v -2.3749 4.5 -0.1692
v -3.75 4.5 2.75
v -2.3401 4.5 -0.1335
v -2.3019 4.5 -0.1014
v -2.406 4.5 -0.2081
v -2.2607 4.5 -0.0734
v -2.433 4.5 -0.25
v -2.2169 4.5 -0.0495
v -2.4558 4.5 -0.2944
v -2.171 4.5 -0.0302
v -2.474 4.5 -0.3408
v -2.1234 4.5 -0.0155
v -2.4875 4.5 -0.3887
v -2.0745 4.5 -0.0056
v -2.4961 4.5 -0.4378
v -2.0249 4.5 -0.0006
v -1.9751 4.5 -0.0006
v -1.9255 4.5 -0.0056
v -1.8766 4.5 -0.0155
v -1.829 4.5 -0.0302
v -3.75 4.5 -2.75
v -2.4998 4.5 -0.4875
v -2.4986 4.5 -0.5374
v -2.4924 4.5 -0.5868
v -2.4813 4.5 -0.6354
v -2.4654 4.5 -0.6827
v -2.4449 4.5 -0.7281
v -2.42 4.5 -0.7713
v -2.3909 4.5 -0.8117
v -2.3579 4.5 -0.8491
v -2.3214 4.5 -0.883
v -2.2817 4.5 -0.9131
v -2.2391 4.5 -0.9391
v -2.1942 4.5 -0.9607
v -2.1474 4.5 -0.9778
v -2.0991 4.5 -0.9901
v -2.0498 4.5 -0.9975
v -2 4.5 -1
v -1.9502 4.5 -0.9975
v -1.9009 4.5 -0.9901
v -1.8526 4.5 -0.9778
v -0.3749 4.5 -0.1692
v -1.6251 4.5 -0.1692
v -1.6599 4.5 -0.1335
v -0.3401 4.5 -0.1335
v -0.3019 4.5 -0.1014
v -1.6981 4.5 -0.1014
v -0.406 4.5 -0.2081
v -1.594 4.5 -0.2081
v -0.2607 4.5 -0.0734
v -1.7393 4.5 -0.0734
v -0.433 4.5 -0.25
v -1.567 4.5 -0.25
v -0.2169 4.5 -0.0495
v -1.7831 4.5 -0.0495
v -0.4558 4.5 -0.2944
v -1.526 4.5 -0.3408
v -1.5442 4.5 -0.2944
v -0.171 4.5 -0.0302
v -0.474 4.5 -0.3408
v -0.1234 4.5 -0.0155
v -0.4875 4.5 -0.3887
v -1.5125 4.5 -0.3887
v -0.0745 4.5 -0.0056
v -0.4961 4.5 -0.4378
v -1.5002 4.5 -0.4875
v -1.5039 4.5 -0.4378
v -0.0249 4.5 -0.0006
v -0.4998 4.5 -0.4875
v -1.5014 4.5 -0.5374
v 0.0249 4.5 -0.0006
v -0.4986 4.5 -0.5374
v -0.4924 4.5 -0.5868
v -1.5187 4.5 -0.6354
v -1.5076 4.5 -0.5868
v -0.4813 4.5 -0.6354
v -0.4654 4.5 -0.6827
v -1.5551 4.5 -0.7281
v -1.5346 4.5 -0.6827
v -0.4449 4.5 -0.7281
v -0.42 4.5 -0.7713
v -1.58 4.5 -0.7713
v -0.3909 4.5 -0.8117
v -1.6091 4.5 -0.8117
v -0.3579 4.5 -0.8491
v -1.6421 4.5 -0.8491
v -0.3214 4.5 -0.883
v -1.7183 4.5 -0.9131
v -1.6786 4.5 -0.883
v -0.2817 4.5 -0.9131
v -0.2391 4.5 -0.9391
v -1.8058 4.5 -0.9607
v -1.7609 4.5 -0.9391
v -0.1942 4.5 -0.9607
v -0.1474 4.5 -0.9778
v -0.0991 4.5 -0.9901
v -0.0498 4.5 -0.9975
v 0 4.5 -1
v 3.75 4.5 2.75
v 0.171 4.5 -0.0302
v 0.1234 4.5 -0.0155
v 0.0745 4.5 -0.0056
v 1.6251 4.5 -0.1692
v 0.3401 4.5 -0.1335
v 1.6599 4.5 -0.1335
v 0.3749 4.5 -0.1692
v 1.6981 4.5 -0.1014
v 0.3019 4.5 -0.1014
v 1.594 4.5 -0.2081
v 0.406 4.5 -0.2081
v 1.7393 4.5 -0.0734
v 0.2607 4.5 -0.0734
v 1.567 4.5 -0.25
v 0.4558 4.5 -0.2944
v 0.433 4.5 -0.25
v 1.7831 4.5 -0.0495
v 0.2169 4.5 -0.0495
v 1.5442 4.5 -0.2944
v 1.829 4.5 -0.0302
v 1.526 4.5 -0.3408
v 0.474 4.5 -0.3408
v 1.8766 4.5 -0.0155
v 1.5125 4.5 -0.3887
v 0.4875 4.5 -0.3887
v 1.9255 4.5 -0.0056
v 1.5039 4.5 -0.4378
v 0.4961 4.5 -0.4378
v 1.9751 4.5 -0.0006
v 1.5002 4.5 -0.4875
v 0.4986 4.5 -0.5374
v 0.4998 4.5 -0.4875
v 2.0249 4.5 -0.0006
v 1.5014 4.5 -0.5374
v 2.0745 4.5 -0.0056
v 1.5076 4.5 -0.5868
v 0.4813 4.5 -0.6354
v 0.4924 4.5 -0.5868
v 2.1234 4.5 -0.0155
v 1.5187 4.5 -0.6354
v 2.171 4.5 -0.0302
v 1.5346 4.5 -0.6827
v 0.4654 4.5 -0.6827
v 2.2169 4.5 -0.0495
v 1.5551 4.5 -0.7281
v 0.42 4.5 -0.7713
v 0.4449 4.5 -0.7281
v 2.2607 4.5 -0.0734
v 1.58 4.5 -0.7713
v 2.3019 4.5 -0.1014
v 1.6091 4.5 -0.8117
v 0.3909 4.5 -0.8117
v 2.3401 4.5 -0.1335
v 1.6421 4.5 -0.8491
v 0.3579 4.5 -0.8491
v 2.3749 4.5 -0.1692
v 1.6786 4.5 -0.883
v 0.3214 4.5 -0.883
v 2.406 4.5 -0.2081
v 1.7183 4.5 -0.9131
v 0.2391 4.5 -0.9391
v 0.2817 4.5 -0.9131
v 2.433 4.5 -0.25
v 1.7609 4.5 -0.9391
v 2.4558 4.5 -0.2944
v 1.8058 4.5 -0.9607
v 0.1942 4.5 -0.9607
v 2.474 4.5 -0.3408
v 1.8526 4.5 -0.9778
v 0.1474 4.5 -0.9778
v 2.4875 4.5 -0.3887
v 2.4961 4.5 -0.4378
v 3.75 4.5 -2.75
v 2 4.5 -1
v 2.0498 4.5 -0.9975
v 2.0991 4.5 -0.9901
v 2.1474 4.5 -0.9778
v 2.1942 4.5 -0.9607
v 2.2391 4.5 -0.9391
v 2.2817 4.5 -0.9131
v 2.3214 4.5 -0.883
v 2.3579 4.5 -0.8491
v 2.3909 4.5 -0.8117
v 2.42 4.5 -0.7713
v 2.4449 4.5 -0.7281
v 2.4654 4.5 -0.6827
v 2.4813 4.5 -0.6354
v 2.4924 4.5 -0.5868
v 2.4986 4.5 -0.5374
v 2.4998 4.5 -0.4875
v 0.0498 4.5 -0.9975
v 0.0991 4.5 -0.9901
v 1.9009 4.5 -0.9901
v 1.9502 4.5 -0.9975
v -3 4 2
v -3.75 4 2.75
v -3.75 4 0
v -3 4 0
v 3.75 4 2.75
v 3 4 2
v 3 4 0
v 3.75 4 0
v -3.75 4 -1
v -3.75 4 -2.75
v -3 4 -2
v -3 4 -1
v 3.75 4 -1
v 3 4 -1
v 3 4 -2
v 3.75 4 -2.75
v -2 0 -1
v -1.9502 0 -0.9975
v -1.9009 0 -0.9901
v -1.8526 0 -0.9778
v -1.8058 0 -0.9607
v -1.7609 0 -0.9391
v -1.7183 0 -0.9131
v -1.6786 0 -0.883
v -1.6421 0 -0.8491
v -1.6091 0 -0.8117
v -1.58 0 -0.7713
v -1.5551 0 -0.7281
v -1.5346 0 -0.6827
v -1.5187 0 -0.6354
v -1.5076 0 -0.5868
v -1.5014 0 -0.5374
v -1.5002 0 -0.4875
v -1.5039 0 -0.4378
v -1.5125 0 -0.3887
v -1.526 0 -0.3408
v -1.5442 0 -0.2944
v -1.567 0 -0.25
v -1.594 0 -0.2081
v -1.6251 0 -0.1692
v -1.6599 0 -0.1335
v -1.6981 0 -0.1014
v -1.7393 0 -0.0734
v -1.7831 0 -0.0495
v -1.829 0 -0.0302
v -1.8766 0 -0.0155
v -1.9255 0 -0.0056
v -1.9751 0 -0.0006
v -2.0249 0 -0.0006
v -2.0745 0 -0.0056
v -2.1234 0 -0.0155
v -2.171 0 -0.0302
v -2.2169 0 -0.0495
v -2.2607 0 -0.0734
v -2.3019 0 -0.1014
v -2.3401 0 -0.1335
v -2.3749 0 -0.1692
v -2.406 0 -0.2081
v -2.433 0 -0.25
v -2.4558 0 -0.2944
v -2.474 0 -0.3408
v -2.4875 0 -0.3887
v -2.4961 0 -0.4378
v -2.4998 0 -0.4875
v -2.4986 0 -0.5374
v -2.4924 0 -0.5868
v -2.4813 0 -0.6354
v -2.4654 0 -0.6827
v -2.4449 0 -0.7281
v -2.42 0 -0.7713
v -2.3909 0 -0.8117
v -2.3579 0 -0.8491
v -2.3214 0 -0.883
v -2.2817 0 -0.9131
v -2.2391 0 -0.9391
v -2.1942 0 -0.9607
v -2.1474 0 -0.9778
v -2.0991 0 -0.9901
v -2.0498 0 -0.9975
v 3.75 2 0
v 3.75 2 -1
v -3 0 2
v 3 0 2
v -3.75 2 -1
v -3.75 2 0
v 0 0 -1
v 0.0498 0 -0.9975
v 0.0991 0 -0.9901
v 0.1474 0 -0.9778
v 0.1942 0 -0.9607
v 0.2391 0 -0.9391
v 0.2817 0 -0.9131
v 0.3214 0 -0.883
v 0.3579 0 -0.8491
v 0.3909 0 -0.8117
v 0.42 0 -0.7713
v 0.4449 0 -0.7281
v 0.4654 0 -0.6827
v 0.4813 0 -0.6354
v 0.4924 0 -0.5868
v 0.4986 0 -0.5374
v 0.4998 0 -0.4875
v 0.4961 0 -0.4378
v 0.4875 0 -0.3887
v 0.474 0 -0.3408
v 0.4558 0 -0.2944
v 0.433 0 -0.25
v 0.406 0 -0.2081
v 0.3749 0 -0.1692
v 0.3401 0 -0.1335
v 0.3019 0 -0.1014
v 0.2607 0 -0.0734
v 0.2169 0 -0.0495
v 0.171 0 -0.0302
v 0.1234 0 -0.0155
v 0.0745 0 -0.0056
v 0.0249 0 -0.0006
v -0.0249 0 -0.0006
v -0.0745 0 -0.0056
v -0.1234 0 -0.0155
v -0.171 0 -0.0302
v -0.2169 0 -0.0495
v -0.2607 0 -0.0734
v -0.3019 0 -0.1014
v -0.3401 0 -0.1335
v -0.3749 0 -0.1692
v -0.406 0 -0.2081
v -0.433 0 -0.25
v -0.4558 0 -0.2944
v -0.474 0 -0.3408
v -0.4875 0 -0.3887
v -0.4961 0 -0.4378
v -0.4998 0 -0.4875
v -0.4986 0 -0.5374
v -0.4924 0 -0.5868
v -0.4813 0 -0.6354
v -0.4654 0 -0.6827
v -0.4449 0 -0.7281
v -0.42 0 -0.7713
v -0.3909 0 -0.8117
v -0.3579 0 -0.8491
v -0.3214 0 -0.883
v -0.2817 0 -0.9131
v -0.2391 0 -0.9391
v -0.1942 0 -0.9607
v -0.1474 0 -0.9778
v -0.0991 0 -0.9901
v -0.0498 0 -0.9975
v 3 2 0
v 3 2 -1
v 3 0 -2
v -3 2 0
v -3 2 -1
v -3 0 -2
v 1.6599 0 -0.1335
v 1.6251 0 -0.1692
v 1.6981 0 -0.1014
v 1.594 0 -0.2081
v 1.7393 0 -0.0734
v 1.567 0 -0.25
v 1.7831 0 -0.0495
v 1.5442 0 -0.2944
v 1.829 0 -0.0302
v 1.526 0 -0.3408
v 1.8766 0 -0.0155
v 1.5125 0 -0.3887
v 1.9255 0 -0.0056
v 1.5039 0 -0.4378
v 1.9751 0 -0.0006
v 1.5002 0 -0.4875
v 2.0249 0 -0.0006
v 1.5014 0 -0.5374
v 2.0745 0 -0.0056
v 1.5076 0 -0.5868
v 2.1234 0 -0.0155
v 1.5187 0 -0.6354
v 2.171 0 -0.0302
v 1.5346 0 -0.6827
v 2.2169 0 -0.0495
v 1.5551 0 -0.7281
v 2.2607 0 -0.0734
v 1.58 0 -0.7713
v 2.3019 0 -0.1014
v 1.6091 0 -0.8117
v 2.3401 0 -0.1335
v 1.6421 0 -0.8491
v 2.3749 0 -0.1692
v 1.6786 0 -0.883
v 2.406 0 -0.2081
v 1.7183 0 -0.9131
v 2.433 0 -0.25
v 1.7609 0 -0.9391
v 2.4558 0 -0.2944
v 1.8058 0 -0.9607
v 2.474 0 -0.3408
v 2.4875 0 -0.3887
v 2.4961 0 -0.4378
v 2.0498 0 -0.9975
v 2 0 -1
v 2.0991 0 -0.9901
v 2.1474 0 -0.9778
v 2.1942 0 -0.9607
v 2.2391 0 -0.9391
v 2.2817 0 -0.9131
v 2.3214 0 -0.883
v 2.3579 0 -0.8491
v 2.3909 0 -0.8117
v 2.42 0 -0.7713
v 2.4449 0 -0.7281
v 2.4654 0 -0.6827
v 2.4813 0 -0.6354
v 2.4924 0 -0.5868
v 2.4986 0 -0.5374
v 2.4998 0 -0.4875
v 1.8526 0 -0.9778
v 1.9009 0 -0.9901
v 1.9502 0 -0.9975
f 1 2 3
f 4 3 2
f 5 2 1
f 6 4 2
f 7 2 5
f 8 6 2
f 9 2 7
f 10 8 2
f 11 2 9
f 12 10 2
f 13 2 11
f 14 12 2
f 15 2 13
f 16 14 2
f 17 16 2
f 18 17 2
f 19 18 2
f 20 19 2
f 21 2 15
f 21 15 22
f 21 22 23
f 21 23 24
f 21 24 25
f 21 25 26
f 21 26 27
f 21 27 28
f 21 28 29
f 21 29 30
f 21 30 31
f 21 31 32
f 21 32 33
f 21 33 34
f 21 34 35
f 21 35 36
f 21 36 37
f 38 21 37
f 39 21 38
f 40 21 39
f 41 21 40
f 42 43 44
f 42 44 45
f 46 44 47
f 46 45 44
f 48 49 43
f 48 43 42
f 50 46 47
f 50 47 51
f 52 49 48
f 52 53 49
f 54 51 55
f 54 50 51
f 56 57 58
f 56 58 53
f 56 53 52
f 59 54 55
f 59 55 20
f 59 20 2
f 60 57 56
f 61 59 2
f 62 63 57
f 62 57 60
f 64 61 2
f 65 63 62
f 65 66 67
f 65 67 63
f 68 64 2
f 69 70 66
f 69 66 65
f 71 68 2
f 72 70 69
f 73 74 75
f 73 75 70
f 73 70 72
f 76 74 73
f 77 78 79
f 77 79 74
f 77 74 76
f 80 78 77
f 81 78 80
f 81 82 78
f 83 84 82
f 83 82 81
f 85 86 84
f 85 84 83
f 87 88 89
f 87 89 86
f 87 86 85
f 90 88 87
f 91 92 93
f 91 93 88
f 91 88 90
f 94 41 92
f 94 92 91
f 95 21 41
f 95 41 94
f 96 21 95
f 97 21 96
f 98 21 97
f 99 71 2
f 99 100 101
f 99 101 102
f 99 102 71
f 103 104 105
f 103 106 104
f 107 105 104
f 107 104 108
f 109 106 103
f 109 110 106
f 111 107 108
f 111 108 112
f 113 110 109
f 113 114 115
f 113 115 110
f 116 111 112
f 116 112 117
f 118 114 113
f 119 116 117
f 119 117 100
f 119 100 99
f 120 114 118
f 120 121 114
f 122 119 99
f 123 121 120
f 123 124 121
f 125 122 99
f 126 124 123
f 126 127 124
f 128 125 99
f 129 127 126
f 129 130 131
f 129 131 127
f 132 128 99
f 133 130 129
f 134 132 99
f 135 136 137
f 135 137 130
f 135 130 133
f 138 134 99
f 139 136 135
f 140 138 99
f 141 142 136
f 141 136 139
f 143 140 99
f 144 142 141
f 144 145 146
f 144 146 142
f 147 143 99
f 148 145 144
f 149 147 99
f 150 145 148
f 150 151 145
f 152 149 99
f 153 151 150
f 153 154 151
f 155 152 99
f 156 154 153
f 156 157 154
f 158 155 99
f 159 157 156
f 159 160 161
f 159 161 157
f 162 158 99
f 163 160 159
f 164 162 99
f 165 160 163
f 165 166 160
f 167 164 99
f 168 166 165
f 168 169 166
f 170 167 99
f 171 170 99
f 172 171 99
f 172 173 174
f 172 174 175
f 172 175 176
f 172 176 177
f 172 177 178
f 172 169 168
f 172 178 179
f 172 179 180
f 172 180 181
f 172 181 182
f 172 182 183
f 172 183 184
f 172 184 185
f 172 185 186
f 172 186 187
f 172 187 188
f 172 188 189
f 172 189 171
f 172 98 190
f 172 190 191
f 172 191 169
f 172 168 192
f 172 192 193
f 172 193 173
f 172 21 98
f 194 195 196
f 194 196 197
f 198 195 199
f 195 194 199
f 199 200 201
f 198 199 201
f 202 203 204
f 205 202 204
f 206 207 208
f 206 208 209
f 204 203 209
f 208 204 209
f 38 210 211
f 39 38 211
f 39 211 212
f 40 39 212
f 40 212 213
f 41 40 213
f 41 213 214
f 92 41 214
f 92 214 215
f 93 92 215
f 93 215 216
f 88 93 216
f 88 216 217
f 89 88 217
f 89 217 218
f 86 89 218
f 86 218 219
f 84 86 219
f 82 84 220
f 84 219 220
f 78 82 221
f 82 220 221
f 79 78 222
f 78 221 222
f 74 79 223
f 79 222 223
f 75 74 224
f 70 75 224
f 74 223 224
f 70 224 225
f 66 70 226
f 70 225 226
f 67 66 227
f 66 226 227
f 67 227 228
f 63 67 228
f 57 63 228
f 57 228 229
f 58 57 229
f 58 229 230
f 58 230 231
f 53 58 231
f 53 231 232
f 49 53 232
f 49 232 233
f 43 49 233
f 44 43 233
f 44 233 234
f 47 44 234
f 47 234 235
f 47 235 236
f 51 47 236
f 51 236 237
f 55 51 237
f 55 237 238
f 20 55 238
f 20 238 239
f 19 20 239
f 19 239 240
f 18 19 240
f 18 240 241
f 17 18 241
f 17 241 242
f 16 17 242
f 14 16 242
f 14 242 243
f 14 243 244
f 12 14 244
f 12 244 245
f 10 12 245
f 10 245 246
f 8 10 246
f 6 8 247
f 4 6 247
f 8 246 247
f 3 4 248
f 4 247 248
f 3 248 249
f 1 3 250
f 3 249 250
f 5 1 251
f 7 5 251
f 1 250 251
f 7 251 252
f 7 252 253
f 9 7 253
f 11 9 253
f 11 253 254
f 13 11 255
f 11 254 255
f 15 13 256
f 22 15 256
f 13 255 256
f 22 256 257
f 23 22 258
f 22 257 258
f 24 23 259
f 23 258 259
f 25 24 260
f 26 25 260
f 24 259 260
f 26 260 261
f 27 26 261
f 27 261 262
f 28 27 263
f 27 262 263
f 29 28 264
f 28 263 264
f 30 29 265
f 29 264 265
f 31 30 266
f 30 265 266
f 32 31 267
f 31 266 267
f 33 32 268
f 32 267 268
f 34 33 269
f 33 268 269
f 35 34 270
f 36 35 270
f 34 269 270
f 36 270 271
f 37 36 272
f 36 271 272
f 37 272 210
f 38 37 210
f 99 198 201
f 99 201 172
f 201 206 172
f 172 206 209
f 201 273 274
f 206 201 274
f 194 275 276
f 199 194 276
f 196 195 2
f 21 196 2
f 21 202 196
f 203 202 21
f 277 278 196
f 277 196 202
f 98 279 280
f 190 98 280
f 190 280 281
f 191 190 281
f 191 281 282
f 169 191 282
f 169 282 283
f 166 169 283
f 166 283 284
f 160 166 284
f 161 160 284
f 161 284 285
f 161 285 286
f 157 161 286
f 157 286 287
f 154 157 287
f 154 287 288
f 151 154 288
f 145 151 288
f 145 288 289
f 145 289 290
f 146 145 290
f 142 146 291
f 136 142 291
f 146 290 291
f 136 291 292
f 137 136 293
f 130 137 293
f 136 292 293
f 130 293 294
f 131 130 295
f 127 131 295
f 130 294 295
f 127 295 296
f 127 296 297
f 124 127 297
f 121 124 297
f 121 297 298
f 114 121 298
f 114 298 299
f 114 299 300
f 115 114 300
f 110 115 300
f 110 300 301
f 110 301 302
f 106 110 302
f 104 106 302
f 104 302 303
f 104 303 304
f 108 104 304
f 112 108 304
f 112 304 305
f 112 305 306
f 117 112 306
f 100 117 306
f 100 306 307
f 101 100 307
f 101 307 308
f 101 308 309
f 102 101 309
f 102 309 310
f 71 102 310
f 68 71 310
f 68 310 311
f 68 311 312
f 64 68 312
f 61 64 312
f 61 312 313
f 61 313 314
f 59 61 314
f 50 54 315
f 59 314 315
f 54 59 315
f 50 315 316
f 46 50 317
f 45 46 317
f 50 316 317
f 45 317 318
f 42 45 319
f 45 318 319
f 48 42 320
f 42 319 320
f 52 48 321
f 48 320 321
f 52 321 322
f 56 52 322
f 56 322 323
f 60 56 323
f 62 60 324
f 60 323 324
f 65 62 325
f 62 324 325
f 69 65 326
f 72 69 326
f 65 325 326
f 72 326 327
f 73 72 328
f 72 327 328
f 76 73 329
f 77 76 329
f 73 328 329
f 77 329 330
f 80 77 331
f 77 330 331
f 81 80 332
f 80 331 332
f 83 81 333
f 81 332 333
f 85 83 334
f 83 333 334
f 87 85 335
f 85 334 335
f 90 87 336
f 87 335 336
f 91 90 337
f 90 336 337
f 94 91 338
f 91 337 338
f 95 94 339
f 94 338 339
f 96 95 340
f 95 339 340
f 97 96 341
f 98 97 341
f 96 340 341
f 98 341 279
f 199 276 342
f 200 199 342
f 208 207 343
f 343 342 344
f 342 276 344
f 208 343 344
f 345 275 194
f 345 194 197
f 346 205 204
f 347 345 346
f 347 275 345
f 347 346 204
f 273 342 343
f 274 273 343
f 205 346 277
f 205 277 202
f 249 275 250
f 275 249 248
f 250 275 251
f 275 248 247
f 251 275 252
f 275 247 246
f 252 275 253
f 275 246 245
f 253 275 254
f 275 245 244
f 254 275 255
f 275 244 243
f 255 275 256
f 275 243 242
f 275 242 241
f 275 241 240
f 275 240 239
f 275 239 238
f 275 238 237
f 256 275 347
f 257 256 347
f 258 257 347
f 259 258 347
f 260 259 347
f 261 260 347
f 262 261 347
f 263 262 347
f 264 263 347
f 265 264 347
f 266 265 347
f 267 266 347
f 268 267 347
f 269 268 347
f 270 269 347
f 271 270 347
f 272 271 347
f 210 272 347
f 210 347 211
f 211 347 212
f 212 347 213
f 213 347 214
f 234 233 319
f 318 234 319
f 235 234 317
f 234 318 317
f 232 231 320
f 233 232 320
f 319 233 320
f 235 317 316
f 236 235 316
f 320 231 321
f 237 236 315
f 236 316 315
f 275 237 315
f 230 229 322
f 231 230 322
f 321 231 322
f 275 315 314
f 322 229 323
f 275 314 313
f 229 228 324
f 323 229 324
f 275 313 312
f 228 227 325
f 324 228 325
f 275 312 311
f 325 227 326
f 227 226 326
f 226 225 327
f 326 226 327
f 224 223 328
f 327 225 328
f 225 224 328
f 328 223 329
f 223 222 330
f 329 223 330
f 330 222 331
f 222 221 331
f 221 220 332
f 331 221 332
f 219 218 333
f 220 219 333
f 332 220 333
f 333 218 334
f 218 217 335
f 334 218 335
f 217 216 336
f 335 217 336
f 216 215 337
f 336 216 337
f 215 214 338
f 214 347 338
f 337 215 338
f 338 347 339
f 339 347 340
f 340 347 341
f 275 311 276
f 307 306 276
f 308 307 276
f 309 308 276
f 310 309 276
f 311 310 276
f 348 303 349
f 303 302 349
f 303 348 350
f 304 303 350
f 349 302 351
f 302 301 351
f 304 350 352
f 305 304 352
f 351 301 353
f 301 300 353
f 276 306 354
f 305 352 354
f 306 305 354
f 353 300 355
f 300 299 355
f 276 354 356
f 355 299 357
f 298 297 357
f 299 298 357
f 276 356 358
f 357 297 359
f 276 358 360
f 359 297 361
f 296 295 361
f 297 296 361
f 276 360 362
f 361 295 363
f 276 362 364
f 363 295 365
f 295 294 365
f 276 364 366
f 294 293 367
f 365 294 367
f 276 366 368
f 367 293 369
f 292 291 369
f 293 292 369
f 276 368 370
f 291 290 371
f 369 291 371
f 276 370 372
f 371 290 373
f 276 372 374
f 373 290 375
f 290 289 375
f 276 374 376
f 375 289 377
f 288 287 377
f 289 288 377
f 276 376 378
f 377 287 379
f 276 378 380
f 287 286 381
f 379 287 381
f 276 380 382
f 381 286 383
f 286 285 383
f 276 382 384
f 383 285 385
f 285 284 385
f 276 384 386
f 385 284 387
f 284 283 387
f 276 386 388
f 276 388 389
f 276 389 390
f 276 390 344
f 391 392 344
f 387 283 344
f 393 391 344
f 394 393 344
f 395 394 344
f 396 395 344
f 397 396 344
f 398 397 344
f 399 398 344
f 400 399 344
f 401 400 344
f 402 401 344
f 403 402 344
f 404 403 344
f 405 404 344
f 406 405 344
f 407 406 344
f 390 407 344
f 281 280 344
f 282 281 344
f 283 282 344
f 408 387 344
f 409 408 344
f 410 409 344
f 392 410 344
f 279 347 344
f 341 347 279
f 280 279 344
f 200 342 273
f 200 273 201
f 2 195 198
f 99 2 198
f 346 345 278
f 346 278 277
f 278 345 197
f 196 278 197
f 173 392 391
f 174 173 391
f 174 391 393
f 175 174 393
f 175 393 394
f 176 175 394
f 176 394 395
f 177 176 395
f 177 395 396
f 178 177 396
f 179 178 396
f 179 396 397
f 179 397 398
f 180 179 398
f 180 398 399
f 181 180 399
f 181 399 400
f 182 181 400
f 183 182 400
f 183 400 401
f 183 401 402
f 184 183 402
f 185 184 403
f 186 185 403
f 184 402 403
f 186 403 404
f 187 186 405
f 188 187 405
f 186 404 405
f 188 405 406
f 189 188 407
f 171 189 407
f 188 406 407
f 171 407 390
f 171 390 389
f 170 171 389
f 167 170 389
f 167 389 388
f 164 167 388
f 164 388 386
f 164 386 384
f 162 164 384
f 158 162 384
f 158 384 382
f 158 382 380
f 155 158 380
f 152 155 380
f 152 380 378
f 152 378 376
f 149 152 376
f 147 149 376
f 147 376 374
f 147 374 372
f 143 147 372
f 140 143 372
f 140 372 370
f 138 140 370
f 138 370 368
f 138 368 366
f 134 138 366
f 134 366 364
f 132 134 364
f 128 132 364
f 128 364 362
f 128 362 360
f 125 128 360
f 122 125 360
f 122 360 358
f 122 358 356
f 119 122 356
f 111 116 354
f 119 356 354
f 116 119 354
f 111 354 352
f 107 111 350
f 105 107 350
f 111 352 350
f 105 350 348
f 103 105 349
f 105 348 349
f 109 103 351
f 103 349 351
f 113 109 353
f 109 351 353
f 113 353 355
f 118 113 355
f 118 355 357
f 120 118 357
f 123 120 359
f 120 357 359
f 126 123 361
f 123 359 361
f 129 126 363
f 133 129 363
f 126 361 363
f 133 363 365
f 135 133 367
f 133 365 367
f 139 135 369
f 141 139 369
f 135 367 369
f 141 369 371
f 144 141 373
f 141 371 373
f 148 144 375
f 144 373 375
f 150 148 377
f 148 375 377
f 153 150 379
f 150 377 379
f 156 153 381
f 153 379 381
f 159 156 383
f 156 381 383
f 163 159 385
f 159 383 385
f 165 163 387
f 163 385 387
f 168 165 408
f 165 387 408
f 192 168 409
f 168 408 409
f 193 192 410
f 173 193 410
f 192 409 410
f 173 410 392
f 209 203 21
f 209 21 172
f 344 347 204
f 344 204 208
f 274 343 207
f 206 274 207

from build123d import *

# Parameters (mm, degrees)
SKETCH1_W           = 6
SKETCH1_H           = 4
BOSS_EXTRUDE1_DEPTH = 4
SKETCH2_W           = 1
SKETCH2_H           = 2
BOSS_EXTRUDE2_DEPTH = 0.75
SKETCH3_W           = 7.5
SKETCH3_H           = 5.5
BOSS_EXTRUDE3_DEPTH = 0.5
SKETCH4_R           = 0.5
CUT_EXTRUDE1_DEPTH  = 7.471089553


with BuildPart() as part:
    # Sketch1 → Boss-Extrude1 (new body)
    with BuildSketch(Plane(origin=(0, 0, 0), x_dir=(1, 0, 0), z_dir=(0, 1, 0))):
        Rectangle(SKETCH1_W, SKETCH1_H)
    extrude(amount=BOSS_EXTRUDE1_DEPTH)

    # Sketch2 → Boss-Extrude2 (add)
    with BuildSketch(Plane(origin=(3, 0, 0), x_dir=(0, 0, -1), z_dir=(1, 0, 0))):
        with Locations((0.5, 3)):
            Rectangle(SKETCH2_W, SKETCH2_H)
    boss_extrude2 = extrude(amount=BOSS_EXTRUDE2_DEPTH)

    # Mirror1: Boss-Extrude2 across plane
    add(boss_extrude2.mirror(Plane(origin=(0, 0, 0), x_dir=(0, 0, 1), z_dir=(1, 0, 0))))

    # Sketch3 → Boss-Extrude3 (add)
    with BuildSketch(Plane(origin=(0, 4, 0), x_dir=(1, 0, 0), z_dir=(0, 1, 0))):
        Rectangle(SKETCH3_W, SKETCH3_H)
    extrude(amount=BOSS_EXTRUDE3_DEPTH)

    # Sketch4 → Cut-Extrude1 (cut, through all)
    with BuildSketch(Plane.XZ):
        with Locations(Location((-2, -0.5, 0), (0, 0, 270))):
            Circle(SKETCH4_R)
        with Locations(Location((0, -0.5, 0), (0, 0, 270))):
            Circle(SKETCH4_R)
        with Locations(Location((2, -0.5, 0), (0, 0, 270))):
            Circle(SKETCH4_R)
    extrude(amount=-CUT_EXTRUDE1_DEPTH, mode=Mode.SUBTRACT)


solid = part.part
